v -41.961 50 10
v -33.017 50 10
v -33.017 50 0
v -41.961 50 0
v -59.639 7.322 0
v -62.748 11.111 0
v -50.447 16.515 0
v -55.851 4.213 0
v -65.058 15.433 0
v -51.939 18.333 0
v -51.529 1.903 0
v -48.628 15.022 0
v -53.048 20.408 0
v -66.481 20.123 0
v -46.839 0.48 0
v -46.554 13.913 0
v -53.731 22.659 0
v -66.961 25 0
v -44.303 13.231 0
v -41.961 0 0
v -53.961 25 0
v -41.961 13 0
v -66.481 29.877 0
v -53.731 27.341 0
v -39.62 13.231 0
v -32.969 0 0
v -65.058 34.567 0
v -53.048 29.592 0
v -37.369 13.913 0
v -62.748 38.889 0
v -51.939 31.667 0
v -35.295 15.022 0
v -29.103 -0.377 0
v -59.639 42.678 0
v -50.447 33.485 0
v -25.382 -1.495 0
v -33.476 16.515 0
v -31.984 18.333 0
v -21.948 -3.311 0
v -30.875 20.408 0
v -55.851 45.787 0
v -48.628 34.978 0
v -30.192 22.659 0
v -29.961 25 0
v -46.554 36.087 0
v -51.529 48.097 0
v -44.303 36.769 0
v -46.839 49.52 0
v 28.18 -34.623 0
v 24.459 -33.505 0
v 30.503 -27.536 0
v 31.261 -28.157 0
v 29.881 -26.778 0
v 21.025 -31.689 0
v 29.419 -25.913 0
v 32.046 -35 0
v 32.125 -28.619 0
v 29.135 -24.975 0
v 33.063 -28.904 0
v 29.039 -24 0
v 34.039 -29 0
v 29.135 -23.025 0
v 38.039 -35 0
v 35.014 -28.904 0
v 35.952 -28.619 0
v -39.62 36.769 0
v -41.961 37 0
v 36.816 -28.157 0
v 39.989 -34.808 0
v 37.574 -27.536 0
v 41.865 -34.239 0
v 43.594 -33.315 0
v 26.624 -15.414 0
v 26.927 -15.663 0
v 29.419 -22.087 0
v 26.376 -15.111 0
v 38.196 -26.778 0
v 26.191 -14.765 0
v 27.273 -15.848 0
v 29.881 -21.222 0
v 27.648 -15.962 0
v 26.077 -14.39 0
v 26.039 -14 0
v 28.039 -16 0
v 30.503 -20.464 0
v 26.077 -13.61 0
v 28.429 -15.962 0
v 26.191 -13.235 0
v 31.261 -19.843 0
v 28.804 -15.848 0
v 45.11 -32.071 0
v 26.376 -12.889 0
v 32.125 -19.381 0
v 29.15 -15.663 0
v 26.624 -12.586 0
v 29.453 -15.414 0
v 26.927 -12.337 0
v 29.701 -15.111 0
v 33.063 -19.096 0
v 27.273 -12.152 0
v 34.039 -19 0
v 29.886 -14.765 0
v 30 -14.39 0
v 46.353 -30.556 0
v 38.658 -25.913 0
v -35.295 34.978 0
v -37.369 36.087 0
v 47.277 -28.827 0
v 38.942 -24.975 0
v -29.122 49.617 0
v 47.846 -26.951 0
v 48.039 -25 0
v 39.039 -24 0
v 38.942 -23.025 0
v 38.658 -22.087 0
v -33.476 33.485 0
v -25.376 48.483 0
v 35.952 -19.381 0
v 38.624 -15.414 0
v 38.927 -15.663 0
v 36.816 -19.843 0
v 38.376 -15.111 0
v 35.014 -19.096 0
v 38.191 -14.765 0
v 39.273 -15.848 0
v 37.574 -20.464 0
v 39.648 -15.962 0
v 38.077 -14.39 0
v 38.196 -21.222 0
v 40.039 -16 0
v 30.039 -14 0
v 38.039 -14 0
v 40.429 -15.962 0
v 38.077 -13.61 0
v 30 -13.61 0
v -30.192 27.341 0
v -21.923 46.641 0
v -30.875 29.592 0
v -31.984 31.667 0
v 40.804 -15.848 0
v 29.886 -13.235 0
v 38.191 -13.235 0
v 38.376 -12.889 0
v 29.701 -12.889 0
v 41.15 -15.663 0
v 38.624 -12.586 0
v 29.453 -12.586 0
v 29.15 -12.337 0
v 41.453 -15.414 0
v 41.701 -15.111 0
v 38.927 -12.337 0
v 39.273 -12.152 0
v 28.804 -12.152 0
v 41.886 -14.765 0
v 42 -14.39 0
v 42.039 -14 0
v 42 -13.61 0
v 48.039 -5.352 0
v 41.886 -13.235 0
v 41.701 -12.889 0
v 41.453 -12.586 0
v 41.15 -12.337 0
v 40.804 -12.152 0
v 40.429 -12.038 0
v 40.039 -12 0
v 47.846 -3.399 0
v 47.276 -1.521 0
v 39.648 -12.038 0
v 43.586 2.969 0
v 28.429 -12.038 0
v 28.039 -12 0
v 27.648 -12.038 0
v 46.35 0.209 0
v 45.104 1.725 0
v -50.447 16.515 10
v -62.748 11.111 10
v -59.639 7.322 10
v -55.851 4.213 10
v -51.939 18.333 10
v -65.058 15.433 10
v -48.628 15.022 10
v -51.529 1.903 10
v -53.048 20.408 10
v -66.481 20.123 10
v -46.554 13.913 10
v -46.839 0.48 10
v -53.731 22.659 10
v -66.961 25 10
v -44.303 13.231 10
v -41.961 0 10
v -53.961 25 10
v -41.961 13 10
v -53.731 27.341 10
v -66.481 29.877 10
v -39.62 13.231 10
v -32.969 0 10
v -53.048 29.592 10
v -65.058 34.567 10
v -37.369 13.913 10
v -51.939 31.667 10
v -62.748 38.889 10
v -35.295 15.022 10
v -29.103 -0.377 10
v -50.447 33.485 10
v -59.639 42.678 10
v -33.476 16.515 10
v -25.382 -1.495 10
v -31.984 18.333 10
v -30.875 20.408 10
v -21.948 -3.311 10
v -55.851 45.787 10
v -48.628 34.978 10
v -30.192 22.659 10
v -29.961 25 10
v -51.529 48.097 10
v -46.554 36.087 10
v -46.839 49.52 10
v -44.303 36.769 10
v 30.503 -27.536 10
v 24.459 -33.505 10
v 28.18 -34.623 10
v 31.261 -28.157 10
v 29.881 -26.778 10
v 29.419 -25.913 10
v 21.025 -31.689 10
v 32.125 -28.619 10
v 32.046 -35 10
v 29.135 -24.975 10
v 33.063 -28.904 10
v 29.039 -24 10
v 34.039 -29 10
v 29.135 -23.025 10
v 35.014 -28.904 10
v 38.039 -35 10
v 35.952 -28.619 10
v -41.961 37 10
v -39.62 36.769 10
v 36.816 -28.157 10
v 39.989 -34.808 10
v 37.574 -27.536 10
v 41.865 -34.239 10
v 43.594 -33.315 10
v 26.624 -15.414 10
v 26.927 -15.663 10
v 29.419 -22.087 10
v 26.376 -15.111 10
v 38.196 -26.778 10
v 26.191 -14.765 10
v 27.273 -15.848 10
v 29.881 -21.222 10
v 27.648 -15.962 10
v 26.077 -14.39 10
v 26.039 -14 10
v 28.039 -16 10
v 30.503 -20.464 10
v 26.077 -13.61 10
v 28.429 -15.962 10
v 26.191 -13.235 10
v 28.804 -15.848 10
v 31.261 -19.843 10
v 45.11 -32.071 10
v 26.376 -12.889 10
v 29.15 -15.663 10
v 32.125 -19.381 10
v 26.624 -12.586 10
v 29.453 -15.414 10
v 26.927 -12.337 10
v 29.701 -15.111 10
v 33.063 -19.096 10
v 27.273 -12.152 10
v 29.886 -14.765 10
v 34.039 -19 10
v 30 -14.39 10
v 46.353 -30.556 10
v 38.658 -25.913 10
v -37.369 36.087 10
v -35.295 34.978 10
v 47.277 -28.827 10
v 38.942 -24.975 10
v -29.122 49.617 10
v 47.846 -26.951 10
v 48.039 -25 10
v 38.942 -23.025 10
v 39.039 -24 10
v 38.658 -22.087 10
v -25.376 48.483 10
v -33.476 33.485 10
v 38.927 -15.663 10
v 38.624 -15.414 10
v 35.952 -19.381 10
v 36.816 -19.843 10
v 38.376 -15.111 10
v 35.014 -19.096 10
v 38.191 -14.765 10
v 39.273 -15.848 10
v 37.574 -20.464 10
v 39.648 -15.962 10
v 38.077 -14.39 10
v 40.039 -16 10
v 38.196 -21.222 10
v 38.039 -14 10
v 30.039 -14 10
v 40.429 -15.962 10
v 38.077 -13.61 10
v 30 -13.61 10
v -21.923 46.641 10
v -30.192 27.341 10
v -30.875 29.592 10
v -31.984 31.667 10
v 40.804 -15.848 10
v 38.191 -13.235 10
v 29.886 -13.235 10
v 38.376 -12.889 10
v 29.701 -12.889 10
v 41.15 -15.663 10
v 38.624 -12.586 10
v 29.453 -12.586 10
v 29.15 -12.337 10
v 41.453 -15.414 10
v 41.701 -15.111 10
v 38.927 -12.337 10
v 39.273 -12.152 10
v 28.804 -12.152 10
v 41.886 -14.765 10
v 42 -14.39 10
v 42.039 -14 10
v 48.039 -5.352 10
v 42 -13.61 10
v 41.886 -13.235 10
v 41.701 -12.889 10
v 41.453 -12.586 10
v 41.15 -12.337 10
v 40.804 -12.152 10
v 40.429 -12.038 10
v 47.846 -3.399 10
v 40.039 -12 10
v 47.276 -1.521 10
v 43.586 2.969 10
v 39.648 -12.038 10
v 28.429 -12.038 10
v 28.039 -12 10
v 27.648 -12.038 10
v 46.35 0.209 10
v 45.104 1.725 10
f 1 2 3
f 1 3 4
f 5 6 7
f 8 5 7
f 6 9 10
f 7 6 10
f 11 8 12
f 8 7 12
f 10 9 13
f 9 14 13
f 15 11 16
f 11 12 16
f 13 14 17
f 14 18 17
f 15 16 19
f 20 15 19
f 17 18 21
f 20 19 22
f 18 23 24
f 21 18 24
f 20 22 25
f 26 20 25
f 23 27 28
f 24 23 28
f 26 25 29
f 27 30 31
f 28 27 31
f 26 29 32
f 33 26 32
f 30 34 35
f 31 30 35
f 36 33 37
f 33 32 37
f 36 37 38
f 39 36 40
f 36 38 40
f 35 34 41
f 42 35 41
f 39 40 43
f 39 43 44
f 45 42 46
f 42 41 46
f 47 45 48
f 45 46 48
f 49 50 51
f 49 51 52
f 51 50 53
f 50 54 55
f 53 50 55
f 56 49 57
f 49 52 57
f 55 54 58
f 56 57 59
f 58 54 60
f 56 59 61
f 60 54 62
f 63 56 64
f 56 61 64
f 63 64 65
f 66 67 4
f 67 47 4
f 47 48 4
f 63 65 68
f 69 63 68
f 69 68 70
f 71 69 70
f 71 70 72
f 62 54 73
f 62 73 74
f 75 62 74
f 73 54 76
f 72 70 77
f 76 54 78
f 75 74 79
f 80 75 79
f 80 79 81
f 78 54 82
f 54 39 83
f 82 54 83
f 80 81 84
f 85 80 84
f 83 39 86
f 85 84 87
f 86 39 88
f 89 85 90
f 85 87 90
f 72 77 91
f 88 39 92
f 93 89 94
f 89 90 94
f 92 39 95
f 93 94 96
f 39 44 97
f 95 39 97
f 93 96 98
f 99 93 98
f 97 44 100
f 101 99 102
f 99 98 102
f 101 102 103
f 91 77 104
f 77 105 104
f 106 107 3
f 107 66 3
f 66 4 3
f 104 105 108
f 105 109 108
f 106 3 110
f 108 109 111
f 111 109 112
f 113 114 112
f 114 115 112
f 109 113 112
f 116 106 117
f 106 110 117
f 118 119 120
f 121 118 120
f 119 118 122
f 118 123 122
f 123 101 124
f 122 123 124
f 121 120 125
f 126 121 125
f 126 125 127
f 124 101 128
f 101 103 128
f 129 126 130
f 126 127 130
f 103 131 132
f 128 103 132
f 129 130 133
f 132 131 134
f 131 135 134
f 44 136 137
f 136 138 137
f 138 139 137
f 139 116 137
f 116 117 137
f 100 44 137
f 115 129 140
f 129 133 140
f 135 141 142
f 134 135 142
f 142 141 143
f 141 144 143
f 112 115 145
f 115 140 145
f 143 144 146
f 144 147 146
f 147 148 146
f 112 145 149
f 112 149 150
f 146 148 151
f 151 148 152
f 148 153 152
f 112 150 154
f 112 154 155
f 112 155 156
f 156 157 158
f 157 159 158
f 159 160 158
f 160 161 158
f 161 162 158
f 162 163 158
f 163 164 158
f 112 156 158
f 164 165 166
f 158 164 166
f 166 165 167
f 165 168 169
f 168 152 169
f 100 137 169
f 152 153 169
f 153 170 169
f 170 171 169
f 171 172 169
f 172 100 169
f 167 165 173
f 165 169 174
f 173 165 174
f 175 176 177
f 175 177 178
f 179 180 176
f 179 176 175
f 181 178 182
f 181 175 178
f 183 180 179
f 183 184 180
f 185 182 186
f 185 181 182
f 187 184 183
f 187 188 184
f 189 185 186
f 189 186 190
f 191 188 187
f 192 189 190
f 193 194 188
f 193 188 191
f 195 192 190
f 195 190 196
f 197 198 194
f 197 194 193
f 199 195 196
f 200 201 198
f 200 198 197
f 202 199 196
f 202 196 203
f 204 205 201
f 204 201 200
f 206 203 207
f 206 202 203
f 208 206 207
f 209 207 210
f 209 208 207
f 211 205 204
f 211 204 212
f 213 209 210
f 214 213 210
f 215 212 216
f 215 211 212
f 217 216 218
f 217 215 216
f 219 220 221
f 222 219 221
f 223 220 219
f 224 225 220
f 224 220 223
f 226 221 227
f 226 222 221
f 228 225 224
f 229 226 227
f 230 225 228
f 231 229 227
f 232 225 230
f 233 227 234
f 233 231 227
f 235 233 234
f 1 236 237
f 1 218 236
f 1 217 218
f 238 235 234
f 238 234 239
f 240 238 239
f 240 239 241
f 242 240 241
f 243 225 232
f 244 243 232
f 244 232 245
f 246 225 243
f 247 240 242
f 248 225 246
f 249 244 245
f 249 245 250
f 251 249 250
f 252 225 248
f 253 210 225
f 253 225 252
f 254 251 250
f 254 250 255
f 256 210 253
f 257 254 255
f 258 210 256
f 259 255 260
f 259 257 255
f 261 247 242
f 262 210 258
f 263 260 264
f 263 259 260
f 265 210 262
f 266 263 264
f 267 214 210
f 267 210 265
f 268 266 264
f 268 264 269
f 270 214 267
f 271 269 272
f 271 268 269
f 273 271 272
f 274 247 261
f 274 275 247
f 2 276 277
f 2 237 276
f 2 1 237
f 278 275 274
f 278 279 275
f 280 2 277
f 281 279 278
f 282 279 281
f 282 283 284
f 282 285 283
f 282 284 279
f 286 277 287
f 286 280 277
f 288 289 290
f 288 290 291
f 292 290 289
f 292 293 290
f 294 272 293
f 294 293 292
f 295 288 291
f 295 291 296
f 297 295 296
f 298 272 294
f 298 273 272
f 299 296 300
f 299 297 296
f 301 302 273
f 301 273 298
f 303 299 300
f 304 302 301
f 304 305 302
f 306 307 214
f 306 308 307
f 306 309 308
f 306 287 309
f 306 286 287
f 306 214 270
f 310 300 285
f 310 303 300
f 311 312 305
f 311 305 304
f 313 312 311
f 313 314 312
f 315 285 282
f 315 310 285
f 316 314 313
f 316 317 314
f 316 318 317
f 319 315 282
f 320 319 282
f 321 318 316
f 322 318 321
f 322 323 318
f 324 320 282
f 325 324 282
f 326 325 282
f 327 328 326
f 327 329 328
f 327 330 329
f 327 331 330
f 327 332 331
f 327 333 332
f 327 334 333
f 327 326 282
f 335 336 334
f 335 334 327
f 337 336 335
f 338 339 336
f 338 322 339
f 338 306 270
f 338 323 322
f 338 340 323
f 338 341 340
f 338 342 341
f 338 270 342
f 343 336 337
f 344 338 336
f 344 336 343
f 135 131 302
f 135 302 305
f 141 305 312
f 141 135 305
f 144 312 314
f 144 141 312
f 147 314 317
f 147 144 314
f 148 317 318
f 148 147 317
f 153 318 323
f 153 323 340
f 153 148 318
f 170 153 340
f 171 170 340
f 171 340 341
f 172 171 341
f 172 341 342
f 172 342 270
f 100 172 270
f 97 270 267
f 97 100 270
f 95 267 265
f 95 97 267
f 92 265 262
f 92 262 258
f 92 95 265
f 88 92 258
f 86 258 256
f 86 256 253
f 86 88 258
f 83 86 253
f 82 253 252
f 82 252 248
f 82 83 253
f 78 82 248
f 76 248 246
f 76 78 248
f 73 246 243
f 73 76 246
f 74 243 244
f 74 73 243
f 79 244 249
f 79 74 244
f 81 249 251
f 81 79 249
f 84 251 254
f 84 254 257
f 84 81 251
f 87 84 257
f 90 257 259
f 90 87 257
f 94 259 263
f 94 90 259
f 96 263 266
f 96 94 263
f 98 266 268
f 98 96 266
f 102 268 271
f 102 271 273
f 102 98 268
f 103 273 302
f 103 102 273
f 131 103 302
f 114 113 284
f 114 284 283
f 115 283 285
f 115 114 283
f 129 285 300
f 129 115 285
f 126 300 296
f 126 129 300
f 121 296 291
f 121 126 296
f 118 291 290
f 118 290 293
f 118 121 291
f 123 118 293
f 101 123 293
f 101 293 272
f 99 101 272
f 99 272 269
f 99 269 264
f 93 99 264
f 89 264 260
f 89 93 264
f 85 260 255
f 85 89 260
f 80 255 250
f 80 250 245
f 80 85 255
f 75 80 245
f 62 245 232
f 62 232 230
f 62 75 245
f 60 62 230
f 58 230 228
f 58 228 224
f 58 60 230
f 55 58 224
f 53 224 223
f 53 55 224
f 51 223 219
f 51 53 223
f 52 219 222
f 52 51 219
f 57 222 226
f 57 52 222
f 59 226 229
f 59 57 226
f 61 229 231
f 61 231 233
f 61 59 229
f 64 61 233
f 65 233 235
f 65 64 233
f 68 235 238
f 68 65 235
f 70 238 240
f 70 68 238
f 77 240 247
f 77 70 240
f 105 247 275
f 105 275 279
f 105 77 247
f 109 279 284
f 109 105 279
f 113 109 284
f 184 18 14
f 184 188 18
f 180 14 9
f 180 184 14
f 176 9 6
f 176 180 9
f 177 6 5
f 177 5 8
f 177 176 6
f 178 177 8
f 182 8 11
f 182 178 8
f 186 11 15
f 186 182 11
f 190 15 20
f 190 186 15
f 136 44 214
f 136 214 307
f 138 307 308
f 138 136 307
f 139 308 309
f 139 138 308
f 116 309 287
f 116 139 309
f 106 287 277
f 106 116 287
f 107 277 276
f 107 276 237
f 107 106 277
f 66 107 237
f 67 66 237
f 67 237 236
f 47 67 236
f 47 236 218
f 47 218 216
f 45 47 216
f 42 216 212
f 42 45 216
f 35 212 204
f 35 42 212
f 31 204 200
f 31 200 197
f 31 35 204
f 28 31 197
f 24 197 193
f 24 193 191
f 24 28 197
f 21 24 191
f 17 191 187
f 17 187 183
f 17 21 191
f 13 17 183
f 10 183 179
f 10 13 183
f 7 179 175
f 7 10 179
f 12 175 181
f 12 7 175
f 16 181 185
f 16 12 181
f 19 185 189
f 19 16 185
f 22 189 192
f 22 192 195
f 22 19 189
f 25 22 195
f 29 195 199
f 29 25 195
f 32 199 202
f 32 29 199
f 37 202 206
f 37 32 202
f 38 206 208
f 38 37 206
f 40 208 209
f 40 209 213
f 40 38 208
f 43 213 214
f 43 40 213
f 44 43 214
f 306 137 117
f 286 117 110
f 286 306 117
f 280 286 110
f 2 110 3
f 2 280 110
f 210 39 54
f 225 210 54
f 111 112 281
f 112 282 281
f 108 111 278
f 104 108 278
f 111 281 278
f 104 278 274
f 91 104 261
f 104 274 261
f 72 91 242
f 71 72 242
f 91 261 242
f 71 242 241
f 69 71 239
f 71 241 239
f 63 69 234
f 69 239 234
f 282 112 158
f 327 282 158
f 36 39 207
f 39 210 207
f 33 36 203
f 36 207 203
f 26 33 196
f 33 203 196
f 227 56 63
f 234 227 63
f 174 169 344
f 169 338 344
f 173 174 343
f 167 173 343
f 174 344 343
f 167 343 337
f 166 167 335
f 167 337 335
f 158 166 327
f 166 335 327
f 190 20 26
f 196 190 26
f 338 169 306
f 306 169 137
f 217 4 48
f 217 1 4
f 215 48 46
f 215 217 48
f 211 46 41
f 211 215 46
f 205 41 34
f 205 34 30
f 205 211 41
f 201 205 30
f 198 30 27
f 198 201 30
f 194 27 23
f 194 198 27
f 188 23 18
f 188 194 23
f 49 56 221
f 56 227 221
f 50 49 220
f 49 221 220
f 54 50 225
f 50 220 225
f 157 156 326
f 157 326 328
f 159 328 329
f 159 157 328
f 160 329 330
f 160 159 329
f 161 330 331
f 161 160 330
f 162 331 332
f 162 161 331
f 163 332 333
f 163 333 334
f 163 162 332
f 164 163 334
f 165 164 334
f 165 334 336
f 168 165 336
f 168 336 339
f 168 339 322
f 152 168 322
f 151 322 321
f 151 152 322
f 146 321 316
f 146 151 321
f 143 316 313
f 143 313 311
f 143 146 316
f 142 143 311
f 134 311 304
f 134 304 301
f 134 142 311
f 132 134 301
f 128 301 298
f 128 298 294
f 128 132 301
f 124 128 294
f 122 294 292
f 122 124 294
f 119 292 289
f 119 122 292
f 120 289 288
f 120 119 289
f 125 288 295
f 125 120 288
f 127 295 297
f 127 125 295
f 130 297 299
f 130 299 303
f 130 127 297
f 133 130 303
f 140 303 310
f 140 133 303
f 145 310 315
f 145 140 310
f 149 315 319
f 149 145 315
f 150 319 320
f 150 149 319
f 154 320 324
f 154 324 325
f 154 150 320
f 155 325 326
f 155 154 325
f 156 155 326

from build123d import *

# Parameters (mm, degrees)
F0_R     = 2
F0_R_2   = 5
F0_R_3   = 12
F1_DEPTH = 10
F2_R     = 24.99999
F3_R     = 10
F4_R     = 20


# Not quite as in the source:
# - a fillet or chamfer is up to 0.001 mm smaller than in the source, because OpenCascade refuses the exact size


with BuildPart() as f1:
    # F0 (on Top) → F1 (new body)
    with BuildSketch(Plane.XY):
        Polygon((-26.9614594782, 50), (-66.9614594782, 50), (-66.9614594782, 0), (-26.9614594782, 0), (26.0385405218, -35), (48.0385405218, -35), (48.0385405218, 0), align=None)
        with Locations((28.0385405218, -14)):
            Circle(F0_R, mode=Mode.SUBTRACT)
        with Locations((34.0385405218, -24)):
            Circle(F0_R_2, mode=Mode.SUBTRACT)
        with Locations((40.0385405218, -14)):
            Circle(F0_R, mode=Mode.SUBTRACT)
        with Locations((-41.9614594782, 25)):
            Circle(F0_R_3, mode=Mode.SUBTRACT)
    extrude(amount=F1_DEPTH)

    # F2 (radius 25 in the source; OpenCascade refuses exactly that, so slightly less here)
    f2_edges = [f1.edges().sort_by_distance(p)[0] for p in [
        (-66.961459, 50, 5),
        (-66.961459, 0, 5),
    ]]
    fillet(f2_edges, radius=F2_R)

    # F3
    f3_edges = [f1.edges().sort_by_distance(p)[0] for p in [
        (48.038541, -35, 5),
        (48.038541, 0, 5),
    ]]
    fillet(f3_edges, radius=F3_R)

    # F4
    f4_edges = [f1.edges().sort_by_distance(p)[0] for p in [
        (-26.961459, 50, 5),
        (-26.961459, 0, 5),
        (26.038541, -35, 5),
    ]]
    fillet(f4_edges, radius=F4_R)


solid = f1.part
